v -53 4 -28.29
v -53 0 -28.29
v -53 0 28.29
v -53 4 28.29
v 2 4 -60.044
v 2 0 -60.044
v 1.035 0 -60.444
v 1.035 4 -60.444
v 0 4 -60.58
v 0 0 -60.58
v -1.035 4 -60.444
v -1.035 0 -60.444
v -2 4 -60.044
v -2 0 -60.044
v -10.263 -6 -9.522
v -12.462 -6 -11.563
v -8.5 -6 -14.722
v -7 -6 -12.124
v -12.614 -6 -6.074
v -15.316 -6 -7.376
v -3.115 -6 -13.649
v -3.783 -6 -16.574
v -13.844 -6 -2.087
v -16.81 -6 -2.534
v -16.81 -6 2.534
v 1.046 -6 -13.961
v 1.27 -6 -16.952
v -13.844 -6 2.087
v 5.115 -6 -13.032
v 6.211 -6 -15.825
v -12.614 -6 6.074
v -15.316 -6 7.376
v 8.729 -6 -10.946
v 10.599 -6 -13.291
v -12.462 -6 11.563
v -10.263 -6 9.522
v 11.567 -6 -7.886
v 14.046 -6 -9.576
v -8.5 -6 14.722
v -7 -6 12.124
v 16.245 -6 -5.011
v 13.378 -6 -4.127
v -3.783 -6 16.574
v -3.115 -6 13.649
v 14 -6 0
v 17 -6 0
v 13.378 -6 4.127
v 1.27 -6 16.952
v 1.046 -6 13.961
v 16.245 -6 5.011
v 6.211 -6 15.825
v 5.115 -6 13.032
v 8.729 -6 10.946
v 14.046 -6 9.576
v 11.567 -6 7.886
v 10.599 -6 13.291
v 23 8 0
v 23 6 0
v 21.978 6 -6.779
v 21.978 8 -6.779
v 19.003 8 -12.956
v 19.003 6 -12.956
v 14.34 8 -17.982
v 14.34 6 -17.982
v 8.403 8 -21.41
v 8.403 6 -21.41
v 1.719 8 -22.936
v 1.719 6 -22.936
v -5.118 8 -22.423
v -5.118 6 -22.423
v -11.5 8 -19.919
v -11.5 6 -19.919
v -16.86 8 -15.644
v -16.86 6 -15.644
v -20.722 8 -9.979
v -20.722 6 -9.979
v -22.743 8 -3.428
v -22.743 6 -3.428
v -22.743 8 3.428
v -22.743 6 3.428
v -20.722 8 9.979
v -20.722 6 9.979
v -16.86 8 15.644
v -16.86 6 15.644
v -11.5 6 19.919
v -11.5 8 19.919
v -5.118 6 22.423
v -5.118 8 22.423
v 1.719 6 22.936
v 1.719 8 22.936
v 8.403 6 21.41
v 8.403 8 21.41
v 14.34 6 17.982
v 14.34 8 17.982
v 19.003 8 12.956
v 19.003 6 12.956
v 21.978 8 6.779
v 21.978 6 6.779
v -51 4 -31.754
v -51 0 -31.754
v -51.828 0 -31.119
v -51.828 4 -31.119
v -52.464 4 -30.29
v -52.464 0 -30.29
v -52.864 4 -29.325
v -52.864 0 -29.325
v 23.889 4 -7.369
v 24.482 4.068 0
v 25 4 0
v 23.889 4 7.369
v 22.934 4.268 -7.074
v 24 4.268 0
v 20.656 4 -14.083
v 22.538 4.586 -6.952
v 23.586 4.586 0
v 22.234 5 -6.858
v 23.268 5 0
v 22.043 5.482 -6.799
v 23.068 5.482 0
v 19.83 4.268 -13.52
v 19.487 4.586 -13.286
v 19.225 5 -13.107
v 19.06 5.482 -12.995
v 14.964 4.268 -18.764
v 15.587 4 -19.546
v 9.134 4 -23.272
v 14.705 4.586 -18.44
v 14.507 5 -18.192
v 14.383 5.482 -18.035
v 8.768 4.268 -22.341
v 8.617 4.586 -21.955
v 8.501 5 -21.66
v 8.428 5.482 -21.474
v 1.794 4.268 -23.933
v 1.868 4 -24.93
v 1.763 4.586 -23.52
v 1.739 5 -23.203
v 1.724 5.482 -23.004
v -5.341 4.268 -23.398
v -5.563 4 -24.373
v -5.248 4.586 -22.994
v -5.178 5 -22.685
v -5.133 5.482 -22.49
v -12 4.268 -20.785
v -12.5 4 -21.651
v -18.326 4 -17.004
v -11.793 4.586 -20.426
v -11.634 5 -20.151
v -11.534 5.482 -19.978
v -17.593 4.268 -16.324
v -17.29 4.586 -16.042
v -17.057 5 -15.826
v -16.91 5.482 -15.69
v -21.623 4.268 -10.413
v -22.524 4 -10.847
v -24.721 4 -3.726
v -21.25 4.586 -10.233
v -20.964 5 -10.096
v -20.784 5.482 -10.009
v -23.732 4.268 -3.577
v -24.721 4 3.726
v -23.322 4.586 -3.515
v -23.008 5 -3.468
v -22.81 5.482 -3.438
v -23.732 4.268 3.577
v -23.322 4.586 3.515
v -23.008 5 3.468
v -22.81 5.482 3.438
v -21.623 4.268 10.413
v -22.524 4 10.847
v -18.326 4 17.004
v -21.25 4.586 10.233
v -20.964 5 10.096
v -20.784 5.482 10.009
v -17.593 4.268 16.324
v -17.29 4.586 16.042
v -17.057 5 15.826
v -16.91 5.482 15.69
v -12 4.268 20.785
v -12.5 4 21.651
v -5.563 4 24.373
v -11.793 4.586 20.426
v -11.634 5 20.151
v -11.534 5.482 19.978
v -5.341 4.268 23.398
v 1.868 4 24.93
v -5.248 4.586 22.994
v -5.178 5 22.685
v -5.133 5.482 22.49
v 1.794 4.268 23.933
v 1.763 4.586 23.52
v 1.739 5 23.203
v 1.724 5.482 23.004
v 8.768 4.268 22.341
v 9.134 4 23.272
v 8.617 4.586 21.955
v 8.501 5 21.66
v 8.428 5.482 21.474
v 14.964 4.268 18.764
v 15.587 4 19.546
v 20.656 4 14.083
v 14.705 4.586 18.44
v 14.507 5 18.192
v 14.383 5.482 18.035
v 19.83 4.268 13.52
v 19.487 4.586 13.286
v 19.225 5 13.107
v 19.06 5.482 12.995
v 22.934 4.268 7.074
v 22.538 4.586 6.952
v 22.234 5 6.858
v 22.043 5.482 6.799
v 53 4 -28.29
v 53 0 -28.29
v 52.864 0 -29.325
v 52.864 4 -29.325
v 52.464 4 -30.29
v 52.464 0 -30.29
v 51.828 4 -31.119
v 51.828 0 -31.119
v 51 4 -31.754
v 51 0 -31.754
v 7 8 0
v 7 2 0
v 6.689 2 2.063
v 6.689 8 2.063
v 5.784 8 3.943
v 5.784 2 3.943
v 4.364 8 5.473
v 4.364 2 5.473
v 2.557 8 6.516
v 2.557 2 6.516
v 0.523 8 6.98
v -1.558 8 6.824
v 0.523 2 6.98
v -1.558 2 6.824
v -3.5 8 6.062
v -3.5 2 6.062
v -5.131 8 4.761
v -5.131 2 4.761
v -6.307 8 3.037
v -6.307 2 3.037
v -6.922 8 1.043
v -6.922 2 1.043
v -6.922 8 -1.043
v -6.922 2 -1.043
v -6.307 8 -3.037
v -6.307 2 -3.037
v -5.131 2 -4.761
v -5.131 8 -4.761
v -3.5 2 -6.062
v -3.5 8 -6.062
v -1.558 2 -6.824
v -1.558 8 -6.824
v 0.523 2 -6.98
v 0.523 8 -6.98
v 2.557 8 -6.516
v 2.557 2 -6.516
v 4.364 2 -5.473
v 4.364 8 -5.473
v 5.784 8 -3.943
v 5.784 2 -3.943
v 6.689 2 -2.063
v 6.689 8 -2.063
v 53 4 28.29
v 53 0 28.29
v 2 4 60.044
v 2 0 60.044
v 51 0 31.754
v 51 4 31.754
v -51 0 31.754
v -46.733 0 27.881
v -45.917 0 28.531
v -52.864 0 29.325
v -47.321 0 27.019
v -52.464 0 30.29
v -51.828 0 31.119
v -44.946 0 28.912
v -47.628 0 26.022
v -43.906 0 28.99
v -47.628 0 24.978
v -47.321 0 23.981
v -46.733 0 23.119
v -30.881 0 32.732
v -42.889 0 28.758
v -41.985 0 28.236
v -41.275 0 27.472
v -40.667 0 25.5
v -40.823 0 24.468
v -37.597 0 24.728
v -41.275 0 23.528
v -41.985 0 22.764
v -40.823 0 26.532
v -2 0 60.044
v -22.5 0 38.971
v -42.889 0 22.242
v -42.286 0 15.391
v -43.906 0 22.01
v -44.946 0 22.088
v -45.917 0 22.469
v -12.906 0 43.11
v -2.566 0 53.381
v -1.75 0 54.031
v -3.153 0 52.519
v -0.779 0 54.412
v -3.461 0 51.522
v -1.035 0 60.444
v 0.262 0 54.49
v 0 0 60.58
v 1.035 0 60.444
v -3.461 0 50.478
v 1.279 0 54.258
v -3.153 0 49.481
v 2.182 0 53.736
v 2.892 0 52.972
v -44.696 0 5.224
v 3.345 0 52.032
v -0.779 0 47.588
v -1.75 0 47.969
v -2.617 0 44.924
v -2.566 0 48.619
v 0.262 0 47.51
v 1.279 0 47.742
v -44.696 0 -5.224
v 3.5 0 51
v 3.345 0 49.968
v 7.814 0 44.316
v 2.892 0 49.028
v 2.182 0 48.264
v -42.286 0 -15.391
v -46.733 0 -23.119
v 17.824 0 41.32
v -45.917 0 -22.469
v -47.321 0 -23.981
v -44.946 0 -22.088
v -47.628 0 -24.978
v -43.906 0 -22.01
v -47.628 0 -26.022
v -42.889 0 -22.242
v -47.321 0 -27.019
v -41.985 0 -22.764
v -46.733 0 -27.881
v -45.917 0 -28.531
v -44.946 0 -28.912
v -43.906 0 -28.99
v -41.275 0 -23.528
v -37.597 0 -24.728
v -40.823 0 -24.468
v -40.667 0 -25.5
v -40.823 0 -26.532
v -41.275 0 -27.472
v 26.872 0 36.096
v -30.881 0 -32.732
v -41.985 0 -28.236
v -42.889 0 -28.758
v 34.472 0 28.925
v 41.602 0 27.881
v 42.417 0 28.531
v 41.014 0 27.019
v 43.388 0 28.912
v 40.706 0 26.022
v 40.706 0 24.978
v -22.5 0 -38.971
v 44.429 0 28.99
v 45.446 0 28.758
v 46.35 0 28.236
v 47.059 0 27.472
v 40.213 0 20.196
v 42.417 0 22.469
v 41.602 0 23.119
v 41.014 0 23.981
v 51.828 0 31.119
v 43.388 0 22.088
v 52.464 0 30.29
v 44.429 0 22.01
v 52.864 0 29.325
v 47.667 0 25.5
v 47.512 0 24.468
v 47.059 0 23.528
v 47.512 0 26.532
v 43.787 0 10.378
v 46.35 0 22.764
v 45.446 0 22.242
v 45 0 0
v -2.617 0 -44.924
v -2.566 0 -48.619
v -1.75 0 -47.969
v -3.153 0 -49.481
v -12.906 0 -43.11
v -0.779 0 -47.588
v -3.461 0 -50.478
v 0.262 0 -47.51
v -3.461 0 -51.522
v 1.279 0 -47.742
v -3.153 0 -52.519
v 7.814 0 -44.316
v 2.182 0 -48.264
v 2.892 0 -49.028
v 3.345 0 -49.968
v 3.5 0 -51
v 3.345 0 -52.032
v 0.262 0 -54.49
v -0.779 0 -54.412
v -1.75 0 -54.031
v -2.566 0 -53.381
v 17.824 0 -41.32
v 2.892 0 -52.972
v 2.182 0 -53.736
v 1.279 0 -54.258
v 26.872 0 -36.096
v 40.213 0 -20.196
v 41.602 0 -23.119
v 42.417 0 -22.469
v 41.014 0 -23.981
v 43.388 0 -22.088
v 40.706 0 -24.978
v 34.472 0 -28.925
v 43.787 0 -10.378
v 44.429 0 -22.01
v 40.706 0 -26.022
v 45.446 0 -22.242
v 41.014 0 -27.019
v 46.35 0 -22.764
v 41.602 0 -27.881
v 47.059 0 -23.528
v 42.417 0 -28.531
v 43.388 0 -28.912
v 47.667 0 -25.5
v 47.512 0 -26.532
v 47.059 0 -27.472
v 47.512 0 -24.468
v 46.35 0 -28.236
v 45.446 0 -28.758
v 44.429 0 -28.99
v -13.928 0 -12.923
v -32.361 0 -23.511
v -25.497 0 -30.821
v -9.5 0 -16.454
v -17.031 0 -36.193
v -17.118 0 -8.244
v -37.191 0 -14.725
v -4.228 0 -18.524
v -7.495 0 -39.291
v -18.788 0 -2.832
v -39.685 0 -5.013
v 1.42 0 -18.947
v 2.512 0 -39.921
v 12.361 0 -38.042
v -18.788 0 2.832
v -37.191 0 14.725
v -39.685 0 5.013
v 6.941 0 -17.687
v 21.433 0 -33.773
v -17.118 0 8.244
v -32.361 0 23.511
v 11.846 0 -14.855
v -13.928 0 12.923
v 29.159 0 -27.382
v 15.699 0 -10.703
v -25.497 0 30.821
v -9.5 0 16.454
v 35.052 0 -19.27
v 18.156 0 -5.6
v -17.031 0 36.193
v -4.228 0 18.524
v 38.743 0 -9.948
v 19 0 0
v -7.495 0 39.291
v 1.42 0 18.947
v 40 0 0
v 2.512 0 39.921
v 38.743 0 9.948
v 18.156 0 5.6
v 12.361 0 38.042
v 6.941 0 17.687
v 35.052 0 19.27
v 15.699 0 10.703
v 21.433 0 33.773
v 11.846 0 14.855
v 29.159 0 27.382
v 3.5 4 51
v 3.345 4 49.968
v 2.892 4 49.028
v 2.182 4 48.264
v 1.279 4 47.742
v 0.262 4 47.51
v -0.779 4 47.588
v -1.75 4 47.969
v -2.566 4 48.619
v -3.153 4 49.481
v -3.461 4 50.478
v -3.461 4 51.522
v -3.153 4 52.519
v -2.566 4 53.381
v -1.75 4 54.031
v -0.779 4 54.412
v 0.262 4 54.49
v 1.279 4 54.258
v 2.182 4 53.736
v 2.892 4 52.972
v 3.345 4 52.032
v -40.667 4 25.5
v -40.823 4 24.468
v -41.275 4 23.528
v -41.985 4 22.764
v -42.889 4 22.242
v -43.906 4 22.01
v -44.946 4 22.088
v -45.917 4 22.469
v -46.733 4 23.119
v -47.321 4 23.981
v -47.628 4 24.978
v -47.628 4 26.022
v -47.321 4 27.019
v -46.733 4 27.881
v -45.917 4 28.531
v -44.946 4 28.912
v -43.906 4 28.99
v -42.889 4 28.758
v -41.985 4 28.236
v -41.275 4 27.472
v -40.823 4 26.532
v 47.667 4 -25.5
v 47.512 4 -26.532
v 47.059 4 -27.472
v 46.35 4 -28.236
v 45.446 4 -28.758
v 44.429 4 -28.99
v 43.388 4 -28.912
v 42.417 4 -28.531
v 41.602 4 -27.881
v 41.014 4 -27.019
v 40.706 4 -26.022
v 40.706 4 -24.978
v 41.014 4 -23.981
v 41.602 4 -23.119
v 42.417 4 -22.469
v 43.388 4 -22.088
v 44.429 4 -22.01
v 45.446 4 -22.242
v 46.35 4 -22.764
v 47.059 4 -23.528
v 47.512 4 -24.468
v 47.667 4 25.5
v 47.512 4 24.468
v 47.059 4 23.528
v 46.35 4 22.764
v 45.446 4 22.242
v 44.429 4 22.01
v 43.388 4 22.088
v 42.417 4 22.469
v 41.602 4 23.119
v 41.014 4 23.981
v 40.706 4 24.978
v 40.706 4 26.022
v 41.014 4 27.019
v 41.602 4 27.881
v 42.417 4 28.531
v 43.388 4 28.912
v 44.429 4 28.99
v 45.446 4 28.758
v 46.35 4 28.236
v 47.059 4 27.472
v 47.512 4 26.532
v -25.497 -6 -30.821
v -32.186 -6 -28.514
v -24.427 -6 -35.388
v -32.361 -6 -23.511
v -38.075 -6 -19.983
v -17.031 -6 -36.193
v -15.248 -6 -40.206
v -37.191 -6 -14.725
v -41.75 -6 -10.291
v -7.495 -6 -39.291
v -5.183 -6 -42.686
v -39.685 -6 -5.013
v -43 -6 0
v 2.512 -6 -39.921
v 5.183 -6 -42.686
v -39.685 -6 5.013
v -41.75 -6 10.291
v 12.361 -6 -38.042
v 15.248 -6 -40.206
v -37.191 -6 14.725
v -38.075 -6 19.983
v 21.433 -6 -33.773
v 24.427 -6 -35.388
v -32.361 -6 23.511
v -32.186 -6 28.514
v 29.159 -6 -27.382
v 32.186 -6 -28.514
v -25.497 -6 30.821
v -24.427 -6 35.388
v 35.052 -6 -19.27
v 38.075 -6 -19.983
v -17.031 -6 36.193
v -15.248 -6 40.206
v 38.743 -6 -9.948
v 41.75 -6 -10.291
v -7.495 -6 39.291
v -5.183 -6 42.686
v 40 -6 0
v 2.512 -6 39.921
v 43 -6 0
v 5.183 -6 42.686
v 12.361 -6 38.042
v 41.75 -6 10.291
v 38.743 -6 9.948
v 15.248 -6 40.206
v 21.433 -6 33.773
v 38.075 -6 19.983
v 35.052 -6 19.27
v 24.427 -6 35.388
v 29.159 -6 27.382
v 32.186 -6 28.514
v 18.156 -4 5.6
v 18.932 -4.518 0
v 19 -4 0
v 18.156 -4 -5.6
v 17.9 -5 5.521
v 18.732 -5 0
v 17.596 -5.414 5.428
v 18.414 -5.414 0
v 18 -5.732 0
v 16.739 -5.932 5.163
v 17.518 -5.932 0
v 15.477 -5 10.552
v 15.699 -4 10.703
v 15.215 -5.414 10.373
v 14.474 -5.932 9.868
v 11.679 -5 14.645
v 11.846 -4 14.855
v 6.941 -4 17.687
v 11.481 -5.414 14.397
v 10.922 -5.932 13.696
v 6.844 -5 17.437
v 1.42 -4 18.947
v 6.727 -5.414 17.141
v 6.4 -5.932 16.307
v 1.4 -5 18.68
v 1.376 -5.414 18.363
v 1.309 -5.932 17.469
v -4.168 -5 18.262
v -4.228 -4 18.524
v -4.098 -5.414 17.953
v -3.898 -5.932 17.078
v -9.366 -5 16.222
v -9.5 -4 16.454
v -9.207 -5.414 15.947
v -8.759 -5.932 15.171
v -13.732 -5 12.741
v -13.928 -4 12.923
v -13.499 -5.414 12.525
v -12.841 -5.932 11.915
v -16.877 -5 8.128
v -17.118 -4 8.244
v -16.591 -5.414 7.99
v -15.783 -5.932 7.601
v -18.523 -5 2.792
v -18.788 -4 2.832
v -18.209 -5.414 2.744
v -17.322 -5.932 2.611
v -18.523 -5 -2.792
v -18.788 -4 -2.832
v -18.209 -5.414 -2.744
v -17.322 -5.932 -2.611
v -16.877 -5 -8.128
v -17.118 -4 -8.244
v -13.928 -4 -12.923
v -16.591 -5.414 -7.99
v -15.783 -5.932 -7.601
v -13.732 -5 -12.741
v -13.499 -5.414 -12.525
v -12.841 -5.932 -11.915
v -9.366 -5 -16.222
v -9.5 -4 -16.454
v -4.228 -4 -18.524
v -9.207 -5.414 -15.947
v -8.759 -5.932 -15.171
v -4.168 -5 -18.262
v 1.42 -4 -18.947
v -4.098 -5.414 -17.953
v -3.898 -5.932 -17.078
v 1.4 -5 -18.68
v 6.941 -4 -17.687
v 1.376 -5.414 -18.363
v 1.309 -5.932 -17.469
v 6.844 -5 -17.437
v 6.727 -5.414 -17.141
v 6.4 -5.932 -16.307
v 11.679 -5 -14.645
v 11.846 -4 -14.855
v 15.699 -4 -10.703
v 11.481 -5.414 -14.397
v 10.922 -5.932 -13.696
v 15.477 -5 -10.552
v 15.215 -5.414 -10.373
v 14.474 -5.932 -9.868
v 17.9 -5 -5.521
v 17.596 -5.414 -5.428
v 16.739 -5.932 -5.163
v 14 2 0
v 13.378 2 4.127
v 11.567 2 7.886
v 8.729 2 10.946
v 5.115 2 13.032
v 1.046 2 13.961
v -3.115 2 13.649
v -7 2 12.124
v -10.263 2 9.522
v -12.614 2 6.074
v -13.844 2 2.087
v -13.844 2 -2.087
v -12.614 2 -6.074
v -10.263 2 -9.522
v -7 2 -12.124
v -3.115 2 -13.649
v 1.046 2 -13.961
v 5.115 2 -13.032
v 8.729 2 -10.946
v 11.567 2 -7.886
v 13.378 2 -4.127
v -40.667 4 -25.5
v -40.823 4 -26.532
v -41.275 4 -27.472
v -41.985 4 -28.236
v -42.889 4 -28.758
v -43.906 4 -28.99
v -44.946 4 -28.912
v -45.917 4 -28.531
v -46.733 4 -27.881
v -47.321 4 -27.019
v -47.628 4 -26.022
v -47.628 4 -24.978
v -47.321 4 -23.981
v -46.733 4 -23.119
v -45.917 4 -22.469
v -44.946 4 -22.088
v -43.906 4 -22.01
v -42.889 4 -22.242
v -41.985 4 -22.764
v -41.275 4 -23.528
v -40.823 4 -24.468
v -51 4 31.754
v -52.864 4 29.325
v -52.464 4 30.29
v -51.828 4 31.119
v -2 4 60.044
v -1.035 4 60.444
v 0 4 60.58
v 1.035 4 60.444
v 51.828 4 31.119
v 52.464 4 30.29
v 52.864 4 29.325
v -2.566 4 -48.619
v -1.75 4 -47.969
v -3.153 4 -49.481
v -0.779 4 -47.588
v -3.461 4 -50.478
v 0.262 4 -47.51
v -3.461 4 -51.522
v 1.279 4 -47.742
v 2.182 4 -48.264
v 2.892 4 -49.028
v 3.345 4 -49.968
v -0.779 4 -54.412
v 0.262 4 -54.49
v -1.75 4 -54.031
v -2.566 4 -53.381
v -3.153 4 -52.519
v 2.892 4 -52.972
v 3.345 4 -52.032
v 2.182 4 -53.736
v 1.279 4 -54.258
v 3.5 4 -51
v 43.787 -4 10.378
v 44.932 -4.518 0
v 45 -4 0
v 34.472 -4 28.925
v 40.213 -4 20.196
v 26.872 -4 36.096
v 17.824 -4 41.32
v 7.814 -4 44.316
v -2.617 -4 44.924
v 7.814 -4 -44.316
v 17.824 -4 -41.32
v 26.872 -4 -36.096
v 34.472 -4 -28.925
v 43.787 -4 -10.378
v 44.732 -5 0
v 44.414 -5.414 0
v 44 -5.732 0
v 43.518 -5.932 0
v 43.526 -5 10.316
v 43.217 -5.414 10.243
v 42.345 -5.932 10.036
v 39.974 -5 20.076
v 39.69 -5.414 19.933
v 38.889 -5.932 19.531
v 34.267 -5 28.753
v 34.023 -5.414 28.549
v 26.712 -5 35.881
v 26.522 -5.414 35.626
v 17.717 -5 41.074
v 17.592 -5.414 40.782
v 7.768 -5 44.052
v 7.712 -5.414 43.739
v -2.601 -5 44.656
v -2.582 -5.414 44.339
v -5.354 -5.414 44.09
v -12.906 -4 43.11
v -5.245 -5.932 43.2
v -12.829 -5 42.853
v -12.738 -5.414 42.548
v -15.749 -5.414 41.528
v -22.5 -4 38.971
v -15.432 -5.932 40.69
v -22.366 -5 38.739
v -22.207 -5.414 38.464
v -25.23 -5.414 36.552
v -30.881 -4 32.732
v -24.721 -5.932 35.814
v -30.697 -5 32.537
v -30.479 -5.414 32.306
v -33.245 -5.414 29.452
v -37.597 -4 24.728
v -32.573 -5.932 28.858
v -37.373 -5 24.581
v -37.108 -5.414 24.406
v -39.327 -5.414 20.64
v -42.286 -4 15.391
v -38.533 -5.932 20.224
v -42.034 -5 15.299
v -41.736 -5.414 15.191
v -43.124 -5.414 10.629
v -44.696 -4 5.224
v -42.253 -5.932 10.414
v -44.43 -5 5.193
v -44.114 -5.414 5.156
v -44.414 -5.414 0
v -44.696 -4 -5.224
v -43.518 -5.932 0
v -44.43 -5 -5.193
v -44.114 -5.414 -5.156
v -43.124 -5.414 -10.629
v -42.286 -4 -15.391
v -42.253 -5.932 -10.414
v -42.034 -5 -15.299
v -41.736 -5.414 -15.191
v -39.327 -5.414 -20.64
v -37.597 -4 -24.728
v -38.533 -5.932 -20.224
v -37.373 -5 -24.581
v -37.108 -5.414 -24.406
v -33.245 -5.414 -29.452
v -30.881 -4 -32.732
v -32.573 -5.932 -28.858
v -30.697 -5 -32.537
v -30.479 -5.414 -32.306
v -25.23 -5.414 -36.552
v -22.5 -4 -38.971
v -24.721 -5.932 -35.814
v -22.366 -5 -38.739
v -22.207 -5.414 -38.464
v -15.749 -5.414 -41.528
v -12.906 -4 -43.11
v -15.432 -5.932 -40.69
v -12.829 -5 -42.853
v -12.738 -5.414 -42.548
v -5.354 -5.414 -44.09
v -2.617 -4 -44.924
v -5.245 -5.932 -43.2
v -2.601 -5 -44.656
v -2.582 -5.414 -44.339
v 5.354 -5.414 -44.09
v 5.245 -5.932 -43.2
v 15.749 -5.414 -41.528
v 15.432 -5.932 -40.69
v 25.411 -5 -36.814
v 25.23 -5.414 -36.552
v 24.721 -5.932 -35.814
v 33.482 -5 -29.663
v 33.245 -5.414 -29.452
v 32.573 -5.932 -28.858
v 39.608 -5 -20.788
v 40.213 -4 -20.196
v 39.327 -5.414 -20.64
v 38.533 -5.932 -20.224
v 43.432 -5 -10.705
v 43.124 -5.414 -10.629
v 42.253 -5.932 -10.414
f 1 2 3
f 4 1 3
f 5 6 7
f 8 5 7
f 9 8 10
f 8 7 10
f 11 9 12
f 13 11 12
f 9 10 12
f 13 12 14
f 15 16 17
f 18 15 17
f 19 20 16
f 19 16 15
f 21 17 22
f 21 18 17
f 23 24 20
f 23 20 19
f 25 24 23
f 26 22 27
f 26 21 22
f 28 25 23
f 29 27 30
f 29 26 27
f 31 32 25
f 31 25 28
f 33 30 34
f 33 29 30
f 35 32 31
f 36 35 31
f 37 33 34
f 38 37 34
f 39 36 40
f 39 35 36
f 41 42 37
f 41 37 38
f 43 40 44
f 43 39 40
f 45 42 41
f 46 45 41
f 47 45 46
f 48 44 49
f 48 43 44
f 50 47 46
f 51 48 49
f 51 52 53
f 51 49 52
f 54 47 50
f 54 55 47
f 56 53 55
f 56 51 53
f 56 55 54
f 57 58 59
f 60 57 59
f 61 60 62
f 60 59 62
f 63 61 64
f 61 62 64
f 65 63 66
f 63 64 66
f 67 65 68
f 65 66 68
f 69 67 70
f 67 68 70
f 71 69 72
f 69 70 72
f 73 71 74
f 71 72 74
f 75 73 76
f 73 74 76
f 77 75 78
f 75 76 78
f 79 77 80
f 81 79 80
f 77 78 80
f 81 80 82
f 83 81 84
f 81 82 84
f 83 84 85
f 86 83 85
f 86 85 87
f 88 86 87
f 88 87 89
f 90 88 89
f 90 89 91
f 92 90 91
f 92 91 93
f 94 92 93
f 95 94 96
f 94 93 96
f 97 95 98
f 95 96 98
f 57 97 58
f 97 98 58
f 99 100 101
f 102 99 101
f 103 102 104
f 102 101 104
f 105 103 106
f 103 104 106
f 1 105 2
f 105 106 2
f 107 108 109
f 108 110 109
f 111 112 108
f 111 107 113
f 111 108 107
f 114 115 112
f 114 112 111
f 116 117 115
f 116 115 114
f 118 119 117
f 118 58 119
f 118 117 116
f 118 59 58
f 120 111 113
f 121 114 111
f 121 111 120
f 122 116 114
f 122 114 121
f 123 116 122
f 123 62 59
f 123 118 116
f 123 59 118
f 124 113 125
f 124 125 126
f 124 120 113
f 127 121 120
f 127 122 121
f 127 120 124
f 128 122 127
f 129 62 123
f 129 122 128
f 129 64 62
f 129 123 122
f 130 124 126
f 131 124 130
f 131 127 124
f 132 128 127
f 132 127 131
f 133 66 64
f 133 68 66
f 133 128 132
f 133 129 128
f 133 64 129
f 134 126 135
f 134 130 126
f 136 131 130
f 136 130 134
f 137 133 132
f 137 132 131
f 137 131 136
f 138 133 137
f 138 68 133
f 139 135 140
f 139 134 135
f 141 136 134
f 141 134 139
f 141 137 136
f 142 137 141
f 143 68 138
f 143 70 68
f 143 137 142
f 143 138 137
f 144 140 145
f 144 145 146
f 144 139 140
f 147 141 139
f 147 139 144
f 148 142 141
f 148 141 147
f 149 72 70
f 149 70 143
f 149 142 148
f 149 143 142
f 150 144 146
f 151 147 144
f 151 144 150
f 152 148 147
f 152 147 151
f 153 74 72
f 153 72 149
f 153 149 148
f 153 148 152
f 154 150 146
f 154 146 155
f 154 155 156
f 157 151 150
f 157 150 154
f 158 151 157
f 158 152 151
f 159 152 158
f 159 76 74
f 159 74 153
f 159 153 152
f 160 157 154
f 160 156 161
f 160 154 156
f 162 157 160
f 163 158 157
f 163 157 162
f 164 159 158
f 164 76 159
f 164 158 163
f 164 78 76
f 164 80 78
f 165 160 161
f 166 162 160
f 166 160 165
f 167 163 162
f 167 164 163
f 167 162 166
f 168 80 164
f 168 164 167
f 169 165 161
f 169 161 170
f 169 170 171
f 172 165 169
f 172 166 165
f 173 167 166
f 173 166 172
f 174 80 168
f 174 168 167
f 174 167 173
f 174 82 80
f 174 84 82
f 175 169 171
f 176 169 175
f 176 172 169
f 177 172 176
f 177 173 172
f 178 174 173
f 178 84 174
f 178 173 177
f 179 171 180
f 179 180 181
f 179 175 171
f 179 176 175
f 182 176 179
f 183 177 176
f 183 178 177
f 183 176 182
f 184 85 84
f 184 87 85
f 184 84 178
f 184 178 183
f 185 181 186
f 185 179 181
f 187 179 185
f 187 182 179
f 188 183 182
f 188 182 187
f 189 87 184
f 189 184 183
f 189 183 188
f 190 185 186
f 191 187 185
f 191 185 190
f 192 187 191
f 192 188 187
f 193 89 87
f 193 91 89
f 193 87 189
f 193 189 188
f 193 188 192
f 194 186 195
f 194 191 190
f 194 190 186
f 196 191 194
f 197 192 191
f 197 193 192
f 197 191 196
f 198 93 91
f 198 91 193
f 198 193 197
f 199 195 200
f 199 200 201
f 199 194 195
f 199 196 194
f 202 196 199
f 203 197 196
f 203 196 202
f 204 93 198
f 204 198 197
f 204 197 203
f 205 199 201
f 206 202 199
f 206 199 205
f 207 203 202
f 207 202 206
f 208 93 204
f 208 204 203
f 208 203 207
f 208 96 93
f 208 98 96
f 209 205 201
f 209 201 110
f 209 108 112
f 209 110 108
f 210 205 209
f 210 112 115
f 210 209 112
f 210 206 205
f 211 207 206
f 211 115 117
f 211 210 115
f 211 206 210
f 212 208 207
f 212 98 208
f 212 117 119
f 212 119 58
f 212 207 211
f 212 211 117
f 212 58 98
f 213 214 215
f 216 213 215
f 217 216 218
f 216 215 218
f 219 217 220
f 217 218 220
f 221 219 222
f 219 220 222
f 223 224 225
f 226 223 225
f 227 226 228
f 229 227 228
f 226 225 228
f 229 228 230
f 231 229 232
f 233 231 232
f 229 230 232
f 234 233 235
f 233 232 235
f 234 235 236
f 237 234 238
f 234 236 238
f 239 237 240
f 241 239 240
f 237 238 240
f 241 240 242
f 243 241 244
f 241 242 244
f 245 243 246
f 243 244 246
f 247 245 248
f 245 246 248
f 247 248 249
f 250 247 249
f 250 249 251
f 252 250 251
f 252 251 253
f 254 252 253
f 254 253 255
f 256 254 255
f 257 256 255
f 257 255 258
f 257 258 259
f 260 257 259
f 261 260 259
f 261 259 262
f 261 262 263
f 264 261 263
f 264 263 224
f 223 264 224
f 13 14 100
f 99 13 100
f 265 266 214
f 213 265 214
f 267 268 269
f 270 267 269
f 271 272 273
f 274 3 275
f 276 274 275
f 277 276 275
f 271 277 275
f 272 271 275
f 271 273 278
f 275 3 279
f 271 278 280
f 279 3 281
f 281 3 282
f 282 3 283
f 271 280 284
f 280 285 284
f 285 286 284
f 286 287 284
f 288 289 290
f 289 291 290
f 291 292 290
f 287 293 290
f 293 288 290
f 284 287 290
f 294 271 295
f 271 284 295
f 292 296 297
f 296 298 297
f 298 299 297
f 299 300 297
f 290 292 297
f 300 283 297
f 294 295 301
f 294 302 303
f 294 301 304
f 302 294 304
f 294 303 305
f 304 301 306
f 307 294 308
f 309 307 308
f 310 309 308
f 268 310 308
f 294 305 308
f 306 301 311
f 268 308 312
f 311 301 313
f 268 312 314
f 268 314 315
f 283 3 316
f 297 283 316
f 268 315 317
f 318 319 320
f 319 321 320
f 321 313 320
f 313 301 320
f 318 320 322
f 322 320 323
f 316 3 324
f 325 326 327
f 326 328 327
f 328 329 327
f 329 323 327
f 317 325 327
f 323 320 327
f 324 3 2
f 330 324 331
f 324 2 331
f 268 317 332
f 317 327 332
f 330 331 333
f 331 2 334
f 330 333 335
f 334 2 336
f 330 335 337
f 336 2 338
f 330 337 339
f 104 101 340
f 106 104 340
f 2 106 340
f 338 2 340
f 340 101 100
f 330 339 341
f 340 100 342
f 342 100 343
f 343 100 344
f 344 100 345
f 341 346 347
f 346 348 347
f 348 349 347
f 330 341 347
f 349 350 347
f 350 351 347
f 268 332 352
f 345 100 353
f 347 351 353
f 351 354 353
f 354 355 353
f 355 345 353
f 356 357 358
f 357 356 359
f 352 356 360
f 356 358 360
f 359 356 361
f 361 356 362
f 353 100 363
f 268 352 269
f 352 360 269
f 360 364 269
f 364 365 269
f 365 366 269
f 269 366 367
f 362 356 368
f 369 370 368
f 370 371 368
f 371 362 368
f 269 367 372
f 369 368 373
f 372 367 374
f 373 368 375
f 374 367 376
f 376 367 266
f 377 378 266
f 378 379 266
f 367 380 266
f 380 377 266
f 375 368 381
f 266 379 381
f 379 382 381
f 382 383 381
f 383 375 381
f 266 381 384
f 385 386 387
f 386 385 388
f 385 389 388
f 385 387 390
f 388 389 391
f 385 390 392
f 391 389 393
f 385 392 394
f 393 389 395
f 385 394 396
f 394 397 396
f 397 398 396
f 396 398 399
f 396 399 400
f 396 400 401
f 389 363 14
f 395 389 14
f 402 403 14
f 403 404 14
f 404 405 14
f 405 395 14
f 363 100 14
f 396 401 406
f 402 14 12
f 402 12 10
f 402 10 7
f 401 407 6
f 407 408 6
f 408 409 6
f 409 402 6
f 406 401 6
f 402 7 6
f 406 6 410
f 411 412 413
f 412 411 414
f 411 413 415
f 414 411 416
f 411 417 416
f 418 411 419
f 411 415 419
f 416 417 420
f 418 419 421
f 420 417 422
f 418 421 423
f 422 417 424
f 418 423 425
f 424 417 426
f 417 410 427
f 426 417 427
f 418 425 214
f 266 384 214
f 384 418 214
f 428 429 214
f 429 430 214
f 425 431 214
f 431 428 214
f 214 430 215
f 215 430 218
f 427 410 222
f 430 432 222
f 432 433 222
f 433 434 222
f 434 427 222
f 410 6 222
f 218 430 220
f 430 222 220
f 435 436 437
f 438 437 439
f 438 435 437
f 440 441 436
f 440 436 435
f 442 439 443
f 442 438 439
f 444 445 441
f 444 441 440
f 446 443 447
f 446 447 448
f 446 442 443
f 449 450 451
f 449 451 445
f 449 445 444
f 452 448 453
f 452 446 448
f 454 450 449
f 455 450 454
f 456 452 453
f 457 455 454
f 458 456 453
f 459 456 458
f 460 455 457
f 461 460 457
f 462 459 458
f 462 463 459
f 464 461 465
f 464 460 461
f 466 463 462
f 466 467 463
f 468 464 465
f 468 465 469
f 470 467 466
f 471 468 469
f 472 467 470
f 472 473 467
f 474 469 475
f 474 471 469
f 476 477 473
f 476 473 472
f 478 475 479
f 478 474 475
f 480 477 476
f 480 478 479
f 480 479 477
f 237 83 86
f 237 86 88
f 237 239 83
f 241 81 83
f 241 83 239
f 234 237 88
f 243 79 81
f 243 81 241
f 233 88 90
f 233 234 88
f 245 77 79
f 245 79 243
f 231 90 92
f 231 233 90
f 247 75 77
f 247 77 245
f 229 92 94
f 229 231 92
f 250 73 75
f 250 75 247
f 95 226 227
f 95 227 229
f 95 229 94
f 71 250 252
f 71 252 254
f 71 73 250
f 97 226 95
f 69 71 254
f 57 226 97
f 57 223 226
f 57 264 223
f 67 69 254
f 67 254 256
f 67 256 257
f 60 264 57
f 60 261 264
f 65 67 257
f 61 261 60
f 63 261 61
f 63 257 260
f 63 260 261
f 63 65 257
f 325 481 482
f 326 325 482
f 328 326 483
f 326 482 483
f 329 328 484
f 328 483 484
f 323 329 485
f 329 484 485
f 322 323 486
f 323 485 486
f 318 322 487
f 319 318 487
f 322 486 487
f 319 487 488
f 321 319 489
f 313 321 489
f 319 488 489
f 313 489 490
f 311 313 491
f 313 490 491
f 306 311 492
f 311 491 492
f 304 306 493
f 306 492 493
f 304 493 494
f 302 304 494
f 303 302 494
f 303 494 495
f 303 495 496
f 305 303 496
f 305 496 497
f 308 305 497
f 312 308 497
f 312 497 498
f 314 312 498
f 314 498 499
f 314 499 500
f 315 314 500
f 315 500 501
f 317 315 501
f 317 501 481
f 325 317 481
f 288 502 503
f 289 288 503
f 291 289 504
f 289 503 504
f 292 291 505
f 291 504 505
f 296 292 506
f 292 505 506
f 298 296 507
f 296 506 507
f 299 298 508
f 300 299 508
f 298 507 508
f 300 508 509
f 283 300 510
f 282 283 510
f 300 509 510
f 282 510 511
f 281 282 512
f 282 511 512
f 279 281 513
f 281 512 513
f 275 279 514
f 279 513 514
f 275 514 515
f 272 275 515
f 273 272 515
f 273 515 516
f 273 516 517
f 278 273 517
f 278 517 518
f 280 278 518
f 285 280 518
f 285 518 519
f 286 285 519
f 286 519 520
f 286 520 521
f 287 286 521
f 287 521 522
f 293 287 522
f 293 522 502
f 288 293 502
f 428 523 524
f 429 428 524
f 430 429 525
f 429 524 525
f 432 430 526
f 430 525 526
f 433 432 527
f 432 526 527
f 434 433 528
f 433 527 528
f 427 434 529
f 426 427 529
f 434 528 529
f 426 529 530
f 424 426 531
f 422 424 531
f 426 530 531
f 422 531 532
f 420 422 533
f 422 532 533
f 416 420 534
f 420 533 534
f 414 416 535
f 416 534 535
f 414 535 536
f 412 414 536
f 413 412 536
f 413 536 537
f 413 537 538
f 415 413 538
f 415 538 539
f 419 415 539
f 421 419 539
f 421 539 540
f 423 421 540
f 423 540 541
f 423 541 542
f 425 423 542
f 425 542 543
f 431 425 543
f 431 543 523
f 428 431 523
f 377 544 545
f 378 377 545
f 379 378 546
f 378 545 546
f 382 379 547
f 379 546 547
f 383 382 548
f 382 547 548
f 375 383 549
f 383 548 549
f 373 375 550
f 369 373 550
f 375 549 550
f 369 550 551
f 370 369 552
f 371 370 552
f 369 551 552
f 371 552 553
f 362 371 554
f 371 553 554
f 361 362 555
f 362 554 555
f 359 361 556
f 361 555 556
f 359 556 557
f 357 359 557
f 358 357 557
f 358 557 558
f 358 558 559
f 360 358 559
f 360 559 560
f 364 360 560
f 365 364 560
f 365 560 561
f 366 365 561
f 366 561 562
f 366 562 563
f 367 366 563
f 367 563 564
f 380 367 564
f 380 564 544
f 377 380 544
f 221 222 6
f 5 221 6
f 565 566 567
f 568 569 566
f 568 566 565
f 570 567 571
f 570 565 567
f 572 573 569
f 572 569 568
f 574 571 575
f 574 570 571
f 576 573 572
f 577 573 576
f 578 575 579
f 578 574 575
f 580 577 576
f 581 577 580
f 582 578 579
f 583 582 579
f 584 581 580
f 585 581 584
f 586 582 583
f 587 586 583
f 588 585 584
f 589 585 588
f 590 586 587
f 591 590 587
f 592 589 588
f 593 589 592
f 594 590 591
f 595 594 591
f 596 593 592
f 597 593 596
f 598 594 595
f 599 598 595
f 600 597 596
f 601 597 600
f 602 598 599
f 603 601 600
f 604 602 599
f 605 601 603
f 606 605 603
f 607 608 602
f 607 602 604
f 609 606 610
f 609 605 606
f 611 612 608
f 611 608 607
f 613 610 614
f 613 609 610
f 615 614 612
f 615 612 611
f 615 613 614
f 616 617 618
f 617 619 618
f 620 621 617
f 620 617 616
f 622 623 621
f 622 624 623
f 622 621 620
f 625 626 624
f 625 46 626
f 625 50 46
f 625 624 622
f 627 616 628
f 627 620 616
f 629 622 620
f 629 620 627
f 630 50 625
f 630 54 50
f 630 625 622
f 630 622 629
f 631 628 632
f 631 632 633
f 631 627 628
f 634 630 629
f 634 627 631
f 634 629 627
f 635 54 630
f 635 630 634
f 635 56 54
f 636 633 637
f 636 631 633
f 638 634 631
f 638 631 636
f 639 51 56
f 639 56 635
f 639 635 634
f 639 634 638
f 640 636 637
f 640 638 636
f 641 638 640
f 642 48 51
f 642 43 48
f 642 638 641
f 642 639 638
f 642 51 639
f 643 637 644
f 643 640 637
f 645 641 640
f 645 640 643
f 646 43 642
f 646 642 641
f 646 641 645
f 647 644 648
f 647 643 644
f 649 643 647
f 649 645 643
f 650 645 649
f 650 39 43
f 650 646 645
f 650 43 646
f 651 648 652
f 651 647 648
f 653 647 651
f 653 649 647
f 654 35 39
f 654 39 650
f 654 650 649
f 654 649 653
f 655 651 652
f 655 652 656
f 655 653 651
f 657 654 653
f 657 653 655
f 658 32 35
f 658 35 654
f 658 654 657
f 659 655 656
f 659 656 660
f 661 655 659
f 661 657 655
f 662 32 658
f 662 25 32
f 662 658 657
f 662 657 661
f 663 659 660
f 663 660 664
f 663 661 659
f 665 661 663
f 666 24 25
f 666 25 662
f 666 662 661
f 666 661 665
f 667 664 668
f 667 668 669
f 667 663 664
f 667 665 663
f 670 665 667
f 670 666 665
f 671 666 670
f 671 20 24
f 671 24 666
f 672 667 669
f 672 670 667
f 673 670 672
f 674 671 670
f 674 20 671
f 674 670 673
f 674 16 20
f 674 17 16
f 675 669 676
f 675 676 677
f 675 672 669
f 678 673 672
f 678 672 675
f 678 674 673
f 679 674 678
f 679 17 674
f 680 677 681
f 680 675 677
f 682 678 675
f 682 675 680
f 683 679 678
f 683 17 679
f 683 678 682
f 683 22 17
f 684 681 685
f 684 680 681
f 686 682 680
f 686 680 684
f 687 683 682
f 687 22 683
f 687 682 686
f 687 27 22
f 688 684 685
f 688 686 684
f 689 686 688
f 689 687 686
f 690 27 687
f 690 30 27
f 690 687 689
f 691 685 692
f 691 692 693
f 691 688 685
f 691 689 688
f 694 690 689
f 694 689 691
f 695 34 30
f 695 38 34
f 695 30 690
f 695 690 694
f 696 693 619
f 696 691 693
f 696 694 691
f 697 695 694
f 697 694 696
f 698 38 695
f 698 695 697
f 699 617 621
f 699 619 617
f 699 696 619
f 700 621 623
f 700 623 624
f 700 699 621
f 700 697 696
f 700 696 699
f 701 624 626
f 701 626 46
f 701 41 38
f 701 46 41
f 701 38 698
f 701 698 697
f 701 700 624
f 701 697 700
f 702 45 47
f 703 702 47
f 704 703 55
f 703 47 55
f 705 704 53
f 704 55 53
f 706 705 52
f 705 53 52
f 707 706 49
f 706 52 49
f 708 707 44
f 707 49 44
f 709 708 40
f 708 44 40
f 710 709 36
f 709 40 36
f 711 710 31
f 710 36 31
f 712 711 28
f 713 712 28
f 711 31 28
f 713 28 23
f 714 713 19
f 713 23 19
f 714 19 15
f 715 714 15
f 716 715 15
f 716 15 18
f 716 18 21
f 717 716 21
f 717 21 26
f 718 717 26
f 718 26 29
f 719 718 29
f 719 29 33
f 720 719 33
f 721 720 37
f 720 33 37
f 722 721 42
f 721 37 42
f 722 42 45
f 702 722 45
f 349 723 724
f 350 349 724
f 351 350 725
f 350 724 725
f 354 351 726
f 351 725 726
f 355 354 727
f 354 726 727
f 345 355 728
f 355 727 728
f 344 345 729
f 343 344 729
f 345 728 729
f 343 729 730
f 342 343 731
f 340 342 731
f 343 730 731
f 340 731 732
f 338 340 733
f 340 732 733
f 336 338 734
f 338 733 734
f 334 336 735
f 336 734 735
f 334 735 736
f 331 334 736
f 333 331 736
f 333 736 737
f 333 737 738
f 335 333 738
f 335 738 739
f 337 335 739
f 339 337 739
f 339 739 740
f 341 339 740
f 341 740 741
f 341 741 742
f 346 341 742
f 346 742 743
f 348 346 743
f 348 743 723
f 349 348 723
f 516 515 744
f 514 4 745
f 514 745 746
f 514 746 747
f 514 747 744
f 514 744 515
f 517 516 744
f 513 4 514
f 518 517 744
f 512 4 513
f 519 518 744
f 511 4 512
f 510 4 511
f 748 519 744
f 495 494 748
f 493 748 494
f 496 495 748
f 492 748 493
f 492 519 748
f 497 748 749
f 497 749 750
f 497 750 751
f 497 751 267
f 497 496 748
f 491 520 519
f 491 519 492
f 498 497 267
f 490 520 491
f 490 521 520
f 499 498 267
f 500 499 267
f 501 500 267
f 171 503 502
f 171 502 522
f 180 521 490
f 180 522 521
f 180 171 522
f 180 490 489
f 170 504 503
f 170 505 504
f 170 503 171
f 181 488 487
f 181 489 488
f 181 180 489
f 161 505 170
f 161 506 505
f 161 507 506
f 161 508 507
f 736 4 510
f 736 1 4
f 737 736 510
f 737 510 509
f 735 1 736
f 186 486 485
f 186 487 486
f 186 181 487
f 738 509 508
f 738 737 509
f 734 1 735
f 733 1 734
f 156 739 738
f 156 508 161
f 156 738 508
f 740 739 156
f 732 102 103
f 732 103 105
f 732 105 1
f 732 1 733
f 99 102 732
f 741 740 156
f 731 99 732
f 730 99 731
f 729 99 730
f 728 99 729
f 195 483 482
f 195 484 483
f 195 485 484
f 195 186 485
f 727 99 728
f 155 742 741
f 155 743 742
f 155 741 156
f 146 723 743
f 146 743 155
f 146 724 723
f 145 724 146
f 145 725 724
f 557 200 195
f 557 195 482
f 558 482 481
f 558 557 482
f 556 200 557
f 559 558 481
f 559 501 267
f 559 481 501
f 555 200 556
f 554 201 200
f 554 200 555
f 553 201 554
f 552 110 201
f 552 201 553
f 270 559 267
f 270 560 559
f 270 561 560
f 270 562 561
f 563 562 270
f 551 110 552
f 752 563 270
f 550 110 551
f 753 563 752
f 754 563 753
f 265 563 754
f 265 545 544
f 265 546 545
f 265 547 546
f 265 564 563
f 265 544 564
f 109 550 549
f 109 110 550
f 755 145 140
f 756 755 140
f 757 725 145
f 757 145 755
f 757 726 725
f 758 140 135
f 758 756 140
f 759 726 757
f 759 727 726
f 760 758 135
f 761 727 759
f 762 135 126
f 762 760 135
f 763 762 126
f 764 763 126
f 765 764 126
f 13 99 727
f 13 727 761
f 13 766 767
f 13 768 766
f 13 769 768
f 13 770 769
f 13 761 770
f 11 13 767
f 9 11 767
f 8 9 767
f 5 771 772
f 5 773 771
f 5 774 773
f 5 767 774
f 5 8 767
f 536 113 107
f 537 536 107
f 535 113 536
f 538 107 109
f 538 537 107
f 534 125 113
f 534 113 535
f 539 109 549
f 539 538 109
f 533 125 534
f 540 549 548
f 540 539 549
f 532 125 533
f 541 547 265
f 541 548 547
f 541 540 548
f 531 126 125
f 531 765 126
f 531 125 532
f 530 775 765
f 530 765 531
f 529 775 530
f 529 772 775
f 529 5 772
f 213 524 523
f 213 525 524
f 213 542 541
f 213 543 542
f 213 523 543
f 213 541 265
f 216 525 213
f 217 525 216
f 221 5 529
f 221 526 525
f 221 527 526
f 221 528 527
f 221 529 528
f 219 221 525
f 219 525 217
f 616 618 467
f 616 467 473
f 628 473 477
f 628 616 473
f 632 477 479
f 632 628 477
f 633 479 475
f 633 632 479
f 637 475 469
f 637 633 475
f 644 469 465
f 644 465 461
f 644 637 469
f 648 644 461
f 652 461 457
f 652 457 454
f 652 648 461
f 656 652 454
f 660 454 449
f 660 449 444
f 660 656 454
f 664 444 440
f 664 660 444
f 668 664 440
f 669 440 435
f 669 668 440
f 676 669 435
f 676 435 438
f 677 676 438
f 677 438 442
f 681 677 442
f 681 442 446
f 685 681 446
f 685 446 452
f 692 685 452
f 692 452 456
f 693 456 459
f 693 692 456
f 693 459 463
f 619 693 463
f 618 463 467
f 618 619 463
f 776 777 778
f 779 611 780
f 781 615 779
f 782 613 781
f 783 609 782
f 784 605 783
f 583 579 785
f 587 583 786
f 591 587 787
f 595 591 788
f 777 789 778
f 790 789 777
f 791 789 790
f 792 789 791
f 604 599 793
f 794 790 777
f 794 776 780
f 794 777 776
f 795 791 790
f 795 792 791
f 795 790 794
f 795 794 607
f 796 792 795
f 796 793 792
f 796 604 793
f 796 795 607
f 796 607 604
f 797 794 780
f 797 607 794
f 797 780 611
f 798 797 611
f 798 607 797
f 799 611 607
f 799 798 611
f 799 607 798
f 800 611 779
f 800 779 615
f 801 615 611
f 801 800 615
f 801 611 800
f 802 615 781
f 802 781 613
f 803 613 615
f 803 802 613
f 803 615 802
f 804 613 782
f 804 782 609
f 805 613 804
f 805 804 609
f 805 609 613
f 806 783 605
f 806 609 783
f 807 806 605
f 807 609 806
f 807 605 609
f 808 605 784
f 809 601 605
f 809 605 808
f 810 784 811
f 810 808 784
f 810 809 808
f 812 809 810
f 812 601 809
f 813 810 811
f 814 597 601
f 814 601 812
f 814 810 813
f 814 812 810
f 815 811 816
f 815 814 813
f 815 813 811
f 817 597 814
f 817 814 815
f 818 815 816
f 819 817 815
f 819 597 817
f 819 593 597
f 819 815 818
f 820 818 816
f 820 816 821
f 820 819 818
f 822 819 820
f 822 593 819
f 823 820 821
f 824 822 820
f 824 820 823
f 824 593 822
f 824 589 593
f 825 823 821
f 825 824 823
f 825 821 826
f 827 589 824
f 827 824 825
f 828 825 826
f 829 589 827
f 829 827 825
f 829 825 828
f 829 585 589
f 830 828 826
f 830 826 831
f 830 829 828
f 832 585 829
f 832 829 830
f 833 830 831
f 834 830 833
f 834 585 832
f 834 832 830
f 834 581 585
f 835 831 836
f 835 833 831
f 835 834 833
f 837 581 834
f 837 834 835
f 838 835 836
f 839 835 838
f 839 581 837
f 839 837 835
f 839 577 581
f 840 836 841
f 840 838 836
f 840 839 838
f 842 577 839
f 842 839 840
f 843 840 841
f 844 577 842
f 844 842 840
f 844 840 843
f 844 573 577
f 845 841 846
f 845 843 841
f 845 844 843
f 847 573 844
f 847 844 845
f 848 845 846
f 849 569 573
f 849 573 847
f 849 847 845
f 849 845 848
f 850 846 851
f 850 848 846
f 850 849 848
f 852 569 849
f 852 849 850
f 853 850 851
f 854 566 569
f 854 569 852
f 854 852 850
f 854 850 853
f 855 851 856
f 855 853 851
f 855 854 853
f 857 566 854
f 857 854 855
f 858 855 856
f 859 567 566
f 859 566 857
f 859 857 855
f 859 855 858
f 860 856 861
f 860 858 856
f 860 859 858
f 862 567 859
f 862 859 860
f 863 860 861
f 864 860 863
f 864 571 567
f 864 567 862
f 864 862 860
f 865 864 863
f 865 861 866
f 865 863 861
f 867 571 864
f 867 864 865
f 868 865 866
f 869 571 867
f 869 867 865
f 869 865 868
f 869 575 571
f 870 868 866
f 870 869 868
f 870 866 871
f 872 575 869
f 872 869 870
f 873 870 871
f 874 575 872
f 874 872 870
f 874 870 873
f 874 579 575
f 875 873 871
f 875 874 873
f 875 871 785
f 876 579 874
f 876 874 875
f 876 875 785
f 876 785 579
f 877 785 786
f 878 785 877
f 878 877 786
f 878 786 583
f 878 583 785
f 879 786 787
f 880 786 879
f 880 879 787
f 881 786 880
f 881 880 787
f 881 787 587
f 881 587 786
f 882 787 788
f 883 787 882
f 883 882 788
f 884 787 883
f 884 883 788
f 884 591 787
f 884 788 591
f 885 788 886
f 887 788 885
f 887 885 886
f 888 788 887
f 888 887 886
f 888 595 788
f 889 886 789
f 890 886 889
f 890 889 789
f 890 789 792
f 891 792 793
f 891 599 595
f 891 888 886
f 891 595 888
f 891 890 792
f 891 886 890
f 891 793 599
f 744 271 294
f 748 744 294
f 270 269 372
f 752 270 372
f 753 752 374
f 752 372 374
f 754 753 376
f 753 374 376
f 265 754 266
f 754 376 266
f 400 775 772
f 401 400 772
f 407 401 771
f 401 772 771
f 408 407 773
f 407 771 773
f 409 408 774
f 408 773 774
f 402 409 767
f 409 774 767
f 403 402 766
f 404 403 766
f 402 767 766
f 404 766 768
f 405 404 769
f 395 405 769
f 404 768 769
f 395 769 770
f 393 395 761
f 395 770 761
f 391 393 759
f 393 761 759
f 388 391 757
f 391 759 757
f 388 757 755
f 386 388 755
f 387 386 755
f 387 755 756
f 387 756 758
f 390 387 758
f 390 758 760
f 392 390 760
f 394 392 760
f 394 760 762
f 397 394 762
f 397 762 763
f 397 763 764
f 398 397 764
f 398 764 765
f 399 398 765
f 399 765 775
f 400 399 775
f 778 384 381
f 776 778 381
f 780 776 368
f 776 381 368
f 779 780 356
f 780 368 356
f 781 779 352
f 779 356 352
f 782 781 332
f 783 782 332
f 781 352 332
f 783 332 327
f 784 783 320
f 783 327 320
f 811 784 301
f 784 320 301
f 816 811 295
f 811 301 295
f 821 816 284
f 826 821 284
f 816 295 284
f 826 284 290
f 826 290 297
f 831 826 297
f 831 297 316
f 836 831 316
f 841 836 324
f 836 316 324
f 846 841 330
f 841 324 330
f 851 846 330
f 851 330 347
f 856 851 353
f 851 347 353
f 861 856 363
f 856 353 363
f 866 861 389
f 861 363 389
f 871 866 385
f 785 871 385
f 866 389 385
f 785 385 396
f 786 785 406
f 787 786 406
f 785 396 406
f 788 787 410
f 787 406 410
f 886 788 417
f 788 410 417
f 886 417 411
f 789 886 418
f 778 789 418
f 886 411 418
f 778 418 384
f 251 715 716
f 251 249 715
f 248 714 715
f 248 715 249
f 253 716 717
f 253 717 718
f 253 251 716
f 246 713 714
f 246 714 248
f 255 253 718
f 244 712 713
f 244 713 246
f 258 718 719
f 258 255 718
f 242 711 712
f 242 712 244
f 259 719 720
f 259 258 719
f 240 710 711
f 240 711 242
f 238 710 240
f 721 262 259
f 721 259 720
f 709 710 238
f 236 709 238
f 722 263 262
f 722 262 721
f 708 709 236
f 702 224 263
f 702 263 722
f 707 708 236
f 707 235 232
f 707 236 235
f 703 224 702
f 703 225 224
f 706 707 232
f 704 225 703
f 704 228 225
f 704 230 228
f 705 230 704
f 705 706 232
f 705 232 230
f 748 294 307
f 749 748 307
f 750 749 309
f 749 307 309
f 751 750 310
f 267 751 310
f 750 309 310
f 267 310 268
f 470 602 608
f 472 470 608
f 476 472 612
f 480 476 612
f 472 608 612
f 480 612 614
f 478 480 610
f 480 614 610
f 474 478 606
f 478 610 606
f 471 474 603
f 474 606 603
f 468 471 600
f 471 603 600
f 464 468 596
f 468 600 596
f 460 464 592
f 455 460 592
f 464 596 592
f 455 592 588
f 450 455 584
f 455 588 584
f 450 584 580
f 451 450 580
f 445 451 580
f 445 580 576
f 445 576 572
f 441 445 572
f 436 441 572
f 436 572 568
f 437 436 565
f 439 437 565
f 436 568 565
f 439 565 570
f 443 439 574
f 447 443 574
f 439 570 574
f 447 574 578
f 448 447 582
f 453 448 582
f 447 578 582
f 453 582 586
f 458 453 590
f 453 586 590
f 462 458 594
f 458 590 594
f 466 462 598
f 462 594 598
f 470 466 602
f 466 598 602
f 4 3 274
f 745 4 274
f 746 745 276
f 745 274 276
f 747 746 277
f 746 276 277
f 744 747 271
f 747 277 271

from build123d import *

# Parameters (mm, degrees)
BOSS_EXTRUDE1_DEPTH = 4
SKETCH2_R           = 23
BOSS_EXTRUDE2_DEPTH = 4
SKETCH3_R           = 45
BOSS_EXTRUDE3_DEPTH = 6
SKETCH4_R           = 40
SKETCH4_R_2         = 19
CUT_EXTRUDE1_DEPTH  = 6
SKETCH5_R           = 14
CUT_EXTRUDE2_DEPTH  = 8
SKETCH6_R           = 7
CUT_EXTRUDE3_DEPTH  = 7
FILLET1_R           = 2
SKETCH7_R           = 3.5
CUT_EXTRUDE4_DEPTH  = 11


with BuildPart() as part:
    # Sketch1 → Boss-Extrude1 (new body)
    with BuildSketch(Plane(origin=(0, 0, 0), x_dir=(1, 0, 0), z_dir=(0, 1, 0))):
        with BuildLine():
            Line((-2, 60.044427996), (-51, 31.754264805))
            ThreePointArc((-51, 31.754264805), (-52.464101615, 30.29016319), (-53, 28.29016319))
            Line((-53, 28.29016319), (-53, -28.29016319))
            ThreePointArc((-53, -28.29016319), (-52.464101615, -30.29016319), (-51, -31.754264805))
            Line((-51, -31.754264805), (-2, -60.044427996))
            ThreePointArc((-2, -60.044427996), (0, -60.580326381), (2, -60.044427996))
            Line((2, -60.044427996), (51, -31.754264805))
            ThreePointArc((51, -31.754264805), (52.464101615, -30.29016319), (53, -28.29016319))
            Line((53, -28.29016319), (53, 28.29016319))
            ThreePointArc((53, 28.29016319), (52.464101615, 30.29016319), (51, 31.754264805))
            Line((51, 31.754264805), (2, 60.044427996))
            ThreePointArc((2, 60.044427996), (0, 60.580326381), (-2, 60.044427996))
        make_face()
    extrude(amount=BOSS_EXTRUDE1_DEPTH)

    # Sketch2 → Boss-Extrude2 (add)
    with BuildSketch(Plane(origin=(0, 4, 0), x_dir=(1, 0, 0), z_dir=(0, 1, 0))):
        Circle(SKETCH2_R)
    extrude(amount=BOSS_EXTRUDE2_DEPTH)

    # Sketch3 → Boss-Extrude3 (add)
    with BuildSketch(Plane.XZ):
        Circle(SKETCH3_R)
    extrude(amount=BOSS_EXTRUDE3_DEPTH)

    # Sketch4 → Cut-Extrude1 (cut)
    with BuildSketch(Plane.XZ.offset(6)):
        Circle(SKETCH4_R)
        Circle(SKETCH4_R_2, mode=Mode.SUBTRACT)
    extrude(amount=-CUT_EXTRUDE1_DEPTH, mode=Mode.SUBTRACT)

    # Sketch5 → Cut-Extrude2 (cut)
    with BuildSketch(Plane.XZ.offset(6)):
        Circle(SKETCH5_R)
    extrude(amount=-CUT_EXTRUDE2_DEPTH, mode=Mode.SUBTRACT)

    # Sketch6 → Cut-Extrude3 (cut, through all)
    with BuildSketch(Plane.XZ.offset(-2)):
        Circle(SKETCH6_R)
    extrude(amount=-CUT_EXTRUDE3_DEPTH, mode=Mode.SUBTRACT)

    # Fillet1
    fillet1_edges = [part.edges().sort_by_distance(p)[0] for p in [
        (-23, 4, 0),
        (-45, -6, 0),
        (-19, -6, 0),
    ]]
    fillet(fillet1_edges, radius=FILLET1_R)

    # Sketch7 → Cut-Extrude4 (cut, through all)
    with BuildSketch(Plane(origin=(0, 4, 0), x_dir=(1, 0, 0), z_dir=(0, 1, 0))):
        with Locations((0, 51)):
            Circle(SKETCH7_R)
        with Locations((44.167295593, 25.5)):
            Circle(SKETCH7_R)
        with Locations((44.167295593, -25.5)):
            Circle(SKETCH7_R)
        with Locations((0, -51)):
            Circle(SKETCH7_R)
        with Locations((-44.167295593, -25.5)):
            Circle(SKETCH7_R)
        with Locations((-44.167295593, 25.5)):
            Circle(SKETCH7_R)
    extrude(amount=-CUT_EXTRUDE4_DEPTH, mode=Mode.SUBTRACT)


solid = part.part
